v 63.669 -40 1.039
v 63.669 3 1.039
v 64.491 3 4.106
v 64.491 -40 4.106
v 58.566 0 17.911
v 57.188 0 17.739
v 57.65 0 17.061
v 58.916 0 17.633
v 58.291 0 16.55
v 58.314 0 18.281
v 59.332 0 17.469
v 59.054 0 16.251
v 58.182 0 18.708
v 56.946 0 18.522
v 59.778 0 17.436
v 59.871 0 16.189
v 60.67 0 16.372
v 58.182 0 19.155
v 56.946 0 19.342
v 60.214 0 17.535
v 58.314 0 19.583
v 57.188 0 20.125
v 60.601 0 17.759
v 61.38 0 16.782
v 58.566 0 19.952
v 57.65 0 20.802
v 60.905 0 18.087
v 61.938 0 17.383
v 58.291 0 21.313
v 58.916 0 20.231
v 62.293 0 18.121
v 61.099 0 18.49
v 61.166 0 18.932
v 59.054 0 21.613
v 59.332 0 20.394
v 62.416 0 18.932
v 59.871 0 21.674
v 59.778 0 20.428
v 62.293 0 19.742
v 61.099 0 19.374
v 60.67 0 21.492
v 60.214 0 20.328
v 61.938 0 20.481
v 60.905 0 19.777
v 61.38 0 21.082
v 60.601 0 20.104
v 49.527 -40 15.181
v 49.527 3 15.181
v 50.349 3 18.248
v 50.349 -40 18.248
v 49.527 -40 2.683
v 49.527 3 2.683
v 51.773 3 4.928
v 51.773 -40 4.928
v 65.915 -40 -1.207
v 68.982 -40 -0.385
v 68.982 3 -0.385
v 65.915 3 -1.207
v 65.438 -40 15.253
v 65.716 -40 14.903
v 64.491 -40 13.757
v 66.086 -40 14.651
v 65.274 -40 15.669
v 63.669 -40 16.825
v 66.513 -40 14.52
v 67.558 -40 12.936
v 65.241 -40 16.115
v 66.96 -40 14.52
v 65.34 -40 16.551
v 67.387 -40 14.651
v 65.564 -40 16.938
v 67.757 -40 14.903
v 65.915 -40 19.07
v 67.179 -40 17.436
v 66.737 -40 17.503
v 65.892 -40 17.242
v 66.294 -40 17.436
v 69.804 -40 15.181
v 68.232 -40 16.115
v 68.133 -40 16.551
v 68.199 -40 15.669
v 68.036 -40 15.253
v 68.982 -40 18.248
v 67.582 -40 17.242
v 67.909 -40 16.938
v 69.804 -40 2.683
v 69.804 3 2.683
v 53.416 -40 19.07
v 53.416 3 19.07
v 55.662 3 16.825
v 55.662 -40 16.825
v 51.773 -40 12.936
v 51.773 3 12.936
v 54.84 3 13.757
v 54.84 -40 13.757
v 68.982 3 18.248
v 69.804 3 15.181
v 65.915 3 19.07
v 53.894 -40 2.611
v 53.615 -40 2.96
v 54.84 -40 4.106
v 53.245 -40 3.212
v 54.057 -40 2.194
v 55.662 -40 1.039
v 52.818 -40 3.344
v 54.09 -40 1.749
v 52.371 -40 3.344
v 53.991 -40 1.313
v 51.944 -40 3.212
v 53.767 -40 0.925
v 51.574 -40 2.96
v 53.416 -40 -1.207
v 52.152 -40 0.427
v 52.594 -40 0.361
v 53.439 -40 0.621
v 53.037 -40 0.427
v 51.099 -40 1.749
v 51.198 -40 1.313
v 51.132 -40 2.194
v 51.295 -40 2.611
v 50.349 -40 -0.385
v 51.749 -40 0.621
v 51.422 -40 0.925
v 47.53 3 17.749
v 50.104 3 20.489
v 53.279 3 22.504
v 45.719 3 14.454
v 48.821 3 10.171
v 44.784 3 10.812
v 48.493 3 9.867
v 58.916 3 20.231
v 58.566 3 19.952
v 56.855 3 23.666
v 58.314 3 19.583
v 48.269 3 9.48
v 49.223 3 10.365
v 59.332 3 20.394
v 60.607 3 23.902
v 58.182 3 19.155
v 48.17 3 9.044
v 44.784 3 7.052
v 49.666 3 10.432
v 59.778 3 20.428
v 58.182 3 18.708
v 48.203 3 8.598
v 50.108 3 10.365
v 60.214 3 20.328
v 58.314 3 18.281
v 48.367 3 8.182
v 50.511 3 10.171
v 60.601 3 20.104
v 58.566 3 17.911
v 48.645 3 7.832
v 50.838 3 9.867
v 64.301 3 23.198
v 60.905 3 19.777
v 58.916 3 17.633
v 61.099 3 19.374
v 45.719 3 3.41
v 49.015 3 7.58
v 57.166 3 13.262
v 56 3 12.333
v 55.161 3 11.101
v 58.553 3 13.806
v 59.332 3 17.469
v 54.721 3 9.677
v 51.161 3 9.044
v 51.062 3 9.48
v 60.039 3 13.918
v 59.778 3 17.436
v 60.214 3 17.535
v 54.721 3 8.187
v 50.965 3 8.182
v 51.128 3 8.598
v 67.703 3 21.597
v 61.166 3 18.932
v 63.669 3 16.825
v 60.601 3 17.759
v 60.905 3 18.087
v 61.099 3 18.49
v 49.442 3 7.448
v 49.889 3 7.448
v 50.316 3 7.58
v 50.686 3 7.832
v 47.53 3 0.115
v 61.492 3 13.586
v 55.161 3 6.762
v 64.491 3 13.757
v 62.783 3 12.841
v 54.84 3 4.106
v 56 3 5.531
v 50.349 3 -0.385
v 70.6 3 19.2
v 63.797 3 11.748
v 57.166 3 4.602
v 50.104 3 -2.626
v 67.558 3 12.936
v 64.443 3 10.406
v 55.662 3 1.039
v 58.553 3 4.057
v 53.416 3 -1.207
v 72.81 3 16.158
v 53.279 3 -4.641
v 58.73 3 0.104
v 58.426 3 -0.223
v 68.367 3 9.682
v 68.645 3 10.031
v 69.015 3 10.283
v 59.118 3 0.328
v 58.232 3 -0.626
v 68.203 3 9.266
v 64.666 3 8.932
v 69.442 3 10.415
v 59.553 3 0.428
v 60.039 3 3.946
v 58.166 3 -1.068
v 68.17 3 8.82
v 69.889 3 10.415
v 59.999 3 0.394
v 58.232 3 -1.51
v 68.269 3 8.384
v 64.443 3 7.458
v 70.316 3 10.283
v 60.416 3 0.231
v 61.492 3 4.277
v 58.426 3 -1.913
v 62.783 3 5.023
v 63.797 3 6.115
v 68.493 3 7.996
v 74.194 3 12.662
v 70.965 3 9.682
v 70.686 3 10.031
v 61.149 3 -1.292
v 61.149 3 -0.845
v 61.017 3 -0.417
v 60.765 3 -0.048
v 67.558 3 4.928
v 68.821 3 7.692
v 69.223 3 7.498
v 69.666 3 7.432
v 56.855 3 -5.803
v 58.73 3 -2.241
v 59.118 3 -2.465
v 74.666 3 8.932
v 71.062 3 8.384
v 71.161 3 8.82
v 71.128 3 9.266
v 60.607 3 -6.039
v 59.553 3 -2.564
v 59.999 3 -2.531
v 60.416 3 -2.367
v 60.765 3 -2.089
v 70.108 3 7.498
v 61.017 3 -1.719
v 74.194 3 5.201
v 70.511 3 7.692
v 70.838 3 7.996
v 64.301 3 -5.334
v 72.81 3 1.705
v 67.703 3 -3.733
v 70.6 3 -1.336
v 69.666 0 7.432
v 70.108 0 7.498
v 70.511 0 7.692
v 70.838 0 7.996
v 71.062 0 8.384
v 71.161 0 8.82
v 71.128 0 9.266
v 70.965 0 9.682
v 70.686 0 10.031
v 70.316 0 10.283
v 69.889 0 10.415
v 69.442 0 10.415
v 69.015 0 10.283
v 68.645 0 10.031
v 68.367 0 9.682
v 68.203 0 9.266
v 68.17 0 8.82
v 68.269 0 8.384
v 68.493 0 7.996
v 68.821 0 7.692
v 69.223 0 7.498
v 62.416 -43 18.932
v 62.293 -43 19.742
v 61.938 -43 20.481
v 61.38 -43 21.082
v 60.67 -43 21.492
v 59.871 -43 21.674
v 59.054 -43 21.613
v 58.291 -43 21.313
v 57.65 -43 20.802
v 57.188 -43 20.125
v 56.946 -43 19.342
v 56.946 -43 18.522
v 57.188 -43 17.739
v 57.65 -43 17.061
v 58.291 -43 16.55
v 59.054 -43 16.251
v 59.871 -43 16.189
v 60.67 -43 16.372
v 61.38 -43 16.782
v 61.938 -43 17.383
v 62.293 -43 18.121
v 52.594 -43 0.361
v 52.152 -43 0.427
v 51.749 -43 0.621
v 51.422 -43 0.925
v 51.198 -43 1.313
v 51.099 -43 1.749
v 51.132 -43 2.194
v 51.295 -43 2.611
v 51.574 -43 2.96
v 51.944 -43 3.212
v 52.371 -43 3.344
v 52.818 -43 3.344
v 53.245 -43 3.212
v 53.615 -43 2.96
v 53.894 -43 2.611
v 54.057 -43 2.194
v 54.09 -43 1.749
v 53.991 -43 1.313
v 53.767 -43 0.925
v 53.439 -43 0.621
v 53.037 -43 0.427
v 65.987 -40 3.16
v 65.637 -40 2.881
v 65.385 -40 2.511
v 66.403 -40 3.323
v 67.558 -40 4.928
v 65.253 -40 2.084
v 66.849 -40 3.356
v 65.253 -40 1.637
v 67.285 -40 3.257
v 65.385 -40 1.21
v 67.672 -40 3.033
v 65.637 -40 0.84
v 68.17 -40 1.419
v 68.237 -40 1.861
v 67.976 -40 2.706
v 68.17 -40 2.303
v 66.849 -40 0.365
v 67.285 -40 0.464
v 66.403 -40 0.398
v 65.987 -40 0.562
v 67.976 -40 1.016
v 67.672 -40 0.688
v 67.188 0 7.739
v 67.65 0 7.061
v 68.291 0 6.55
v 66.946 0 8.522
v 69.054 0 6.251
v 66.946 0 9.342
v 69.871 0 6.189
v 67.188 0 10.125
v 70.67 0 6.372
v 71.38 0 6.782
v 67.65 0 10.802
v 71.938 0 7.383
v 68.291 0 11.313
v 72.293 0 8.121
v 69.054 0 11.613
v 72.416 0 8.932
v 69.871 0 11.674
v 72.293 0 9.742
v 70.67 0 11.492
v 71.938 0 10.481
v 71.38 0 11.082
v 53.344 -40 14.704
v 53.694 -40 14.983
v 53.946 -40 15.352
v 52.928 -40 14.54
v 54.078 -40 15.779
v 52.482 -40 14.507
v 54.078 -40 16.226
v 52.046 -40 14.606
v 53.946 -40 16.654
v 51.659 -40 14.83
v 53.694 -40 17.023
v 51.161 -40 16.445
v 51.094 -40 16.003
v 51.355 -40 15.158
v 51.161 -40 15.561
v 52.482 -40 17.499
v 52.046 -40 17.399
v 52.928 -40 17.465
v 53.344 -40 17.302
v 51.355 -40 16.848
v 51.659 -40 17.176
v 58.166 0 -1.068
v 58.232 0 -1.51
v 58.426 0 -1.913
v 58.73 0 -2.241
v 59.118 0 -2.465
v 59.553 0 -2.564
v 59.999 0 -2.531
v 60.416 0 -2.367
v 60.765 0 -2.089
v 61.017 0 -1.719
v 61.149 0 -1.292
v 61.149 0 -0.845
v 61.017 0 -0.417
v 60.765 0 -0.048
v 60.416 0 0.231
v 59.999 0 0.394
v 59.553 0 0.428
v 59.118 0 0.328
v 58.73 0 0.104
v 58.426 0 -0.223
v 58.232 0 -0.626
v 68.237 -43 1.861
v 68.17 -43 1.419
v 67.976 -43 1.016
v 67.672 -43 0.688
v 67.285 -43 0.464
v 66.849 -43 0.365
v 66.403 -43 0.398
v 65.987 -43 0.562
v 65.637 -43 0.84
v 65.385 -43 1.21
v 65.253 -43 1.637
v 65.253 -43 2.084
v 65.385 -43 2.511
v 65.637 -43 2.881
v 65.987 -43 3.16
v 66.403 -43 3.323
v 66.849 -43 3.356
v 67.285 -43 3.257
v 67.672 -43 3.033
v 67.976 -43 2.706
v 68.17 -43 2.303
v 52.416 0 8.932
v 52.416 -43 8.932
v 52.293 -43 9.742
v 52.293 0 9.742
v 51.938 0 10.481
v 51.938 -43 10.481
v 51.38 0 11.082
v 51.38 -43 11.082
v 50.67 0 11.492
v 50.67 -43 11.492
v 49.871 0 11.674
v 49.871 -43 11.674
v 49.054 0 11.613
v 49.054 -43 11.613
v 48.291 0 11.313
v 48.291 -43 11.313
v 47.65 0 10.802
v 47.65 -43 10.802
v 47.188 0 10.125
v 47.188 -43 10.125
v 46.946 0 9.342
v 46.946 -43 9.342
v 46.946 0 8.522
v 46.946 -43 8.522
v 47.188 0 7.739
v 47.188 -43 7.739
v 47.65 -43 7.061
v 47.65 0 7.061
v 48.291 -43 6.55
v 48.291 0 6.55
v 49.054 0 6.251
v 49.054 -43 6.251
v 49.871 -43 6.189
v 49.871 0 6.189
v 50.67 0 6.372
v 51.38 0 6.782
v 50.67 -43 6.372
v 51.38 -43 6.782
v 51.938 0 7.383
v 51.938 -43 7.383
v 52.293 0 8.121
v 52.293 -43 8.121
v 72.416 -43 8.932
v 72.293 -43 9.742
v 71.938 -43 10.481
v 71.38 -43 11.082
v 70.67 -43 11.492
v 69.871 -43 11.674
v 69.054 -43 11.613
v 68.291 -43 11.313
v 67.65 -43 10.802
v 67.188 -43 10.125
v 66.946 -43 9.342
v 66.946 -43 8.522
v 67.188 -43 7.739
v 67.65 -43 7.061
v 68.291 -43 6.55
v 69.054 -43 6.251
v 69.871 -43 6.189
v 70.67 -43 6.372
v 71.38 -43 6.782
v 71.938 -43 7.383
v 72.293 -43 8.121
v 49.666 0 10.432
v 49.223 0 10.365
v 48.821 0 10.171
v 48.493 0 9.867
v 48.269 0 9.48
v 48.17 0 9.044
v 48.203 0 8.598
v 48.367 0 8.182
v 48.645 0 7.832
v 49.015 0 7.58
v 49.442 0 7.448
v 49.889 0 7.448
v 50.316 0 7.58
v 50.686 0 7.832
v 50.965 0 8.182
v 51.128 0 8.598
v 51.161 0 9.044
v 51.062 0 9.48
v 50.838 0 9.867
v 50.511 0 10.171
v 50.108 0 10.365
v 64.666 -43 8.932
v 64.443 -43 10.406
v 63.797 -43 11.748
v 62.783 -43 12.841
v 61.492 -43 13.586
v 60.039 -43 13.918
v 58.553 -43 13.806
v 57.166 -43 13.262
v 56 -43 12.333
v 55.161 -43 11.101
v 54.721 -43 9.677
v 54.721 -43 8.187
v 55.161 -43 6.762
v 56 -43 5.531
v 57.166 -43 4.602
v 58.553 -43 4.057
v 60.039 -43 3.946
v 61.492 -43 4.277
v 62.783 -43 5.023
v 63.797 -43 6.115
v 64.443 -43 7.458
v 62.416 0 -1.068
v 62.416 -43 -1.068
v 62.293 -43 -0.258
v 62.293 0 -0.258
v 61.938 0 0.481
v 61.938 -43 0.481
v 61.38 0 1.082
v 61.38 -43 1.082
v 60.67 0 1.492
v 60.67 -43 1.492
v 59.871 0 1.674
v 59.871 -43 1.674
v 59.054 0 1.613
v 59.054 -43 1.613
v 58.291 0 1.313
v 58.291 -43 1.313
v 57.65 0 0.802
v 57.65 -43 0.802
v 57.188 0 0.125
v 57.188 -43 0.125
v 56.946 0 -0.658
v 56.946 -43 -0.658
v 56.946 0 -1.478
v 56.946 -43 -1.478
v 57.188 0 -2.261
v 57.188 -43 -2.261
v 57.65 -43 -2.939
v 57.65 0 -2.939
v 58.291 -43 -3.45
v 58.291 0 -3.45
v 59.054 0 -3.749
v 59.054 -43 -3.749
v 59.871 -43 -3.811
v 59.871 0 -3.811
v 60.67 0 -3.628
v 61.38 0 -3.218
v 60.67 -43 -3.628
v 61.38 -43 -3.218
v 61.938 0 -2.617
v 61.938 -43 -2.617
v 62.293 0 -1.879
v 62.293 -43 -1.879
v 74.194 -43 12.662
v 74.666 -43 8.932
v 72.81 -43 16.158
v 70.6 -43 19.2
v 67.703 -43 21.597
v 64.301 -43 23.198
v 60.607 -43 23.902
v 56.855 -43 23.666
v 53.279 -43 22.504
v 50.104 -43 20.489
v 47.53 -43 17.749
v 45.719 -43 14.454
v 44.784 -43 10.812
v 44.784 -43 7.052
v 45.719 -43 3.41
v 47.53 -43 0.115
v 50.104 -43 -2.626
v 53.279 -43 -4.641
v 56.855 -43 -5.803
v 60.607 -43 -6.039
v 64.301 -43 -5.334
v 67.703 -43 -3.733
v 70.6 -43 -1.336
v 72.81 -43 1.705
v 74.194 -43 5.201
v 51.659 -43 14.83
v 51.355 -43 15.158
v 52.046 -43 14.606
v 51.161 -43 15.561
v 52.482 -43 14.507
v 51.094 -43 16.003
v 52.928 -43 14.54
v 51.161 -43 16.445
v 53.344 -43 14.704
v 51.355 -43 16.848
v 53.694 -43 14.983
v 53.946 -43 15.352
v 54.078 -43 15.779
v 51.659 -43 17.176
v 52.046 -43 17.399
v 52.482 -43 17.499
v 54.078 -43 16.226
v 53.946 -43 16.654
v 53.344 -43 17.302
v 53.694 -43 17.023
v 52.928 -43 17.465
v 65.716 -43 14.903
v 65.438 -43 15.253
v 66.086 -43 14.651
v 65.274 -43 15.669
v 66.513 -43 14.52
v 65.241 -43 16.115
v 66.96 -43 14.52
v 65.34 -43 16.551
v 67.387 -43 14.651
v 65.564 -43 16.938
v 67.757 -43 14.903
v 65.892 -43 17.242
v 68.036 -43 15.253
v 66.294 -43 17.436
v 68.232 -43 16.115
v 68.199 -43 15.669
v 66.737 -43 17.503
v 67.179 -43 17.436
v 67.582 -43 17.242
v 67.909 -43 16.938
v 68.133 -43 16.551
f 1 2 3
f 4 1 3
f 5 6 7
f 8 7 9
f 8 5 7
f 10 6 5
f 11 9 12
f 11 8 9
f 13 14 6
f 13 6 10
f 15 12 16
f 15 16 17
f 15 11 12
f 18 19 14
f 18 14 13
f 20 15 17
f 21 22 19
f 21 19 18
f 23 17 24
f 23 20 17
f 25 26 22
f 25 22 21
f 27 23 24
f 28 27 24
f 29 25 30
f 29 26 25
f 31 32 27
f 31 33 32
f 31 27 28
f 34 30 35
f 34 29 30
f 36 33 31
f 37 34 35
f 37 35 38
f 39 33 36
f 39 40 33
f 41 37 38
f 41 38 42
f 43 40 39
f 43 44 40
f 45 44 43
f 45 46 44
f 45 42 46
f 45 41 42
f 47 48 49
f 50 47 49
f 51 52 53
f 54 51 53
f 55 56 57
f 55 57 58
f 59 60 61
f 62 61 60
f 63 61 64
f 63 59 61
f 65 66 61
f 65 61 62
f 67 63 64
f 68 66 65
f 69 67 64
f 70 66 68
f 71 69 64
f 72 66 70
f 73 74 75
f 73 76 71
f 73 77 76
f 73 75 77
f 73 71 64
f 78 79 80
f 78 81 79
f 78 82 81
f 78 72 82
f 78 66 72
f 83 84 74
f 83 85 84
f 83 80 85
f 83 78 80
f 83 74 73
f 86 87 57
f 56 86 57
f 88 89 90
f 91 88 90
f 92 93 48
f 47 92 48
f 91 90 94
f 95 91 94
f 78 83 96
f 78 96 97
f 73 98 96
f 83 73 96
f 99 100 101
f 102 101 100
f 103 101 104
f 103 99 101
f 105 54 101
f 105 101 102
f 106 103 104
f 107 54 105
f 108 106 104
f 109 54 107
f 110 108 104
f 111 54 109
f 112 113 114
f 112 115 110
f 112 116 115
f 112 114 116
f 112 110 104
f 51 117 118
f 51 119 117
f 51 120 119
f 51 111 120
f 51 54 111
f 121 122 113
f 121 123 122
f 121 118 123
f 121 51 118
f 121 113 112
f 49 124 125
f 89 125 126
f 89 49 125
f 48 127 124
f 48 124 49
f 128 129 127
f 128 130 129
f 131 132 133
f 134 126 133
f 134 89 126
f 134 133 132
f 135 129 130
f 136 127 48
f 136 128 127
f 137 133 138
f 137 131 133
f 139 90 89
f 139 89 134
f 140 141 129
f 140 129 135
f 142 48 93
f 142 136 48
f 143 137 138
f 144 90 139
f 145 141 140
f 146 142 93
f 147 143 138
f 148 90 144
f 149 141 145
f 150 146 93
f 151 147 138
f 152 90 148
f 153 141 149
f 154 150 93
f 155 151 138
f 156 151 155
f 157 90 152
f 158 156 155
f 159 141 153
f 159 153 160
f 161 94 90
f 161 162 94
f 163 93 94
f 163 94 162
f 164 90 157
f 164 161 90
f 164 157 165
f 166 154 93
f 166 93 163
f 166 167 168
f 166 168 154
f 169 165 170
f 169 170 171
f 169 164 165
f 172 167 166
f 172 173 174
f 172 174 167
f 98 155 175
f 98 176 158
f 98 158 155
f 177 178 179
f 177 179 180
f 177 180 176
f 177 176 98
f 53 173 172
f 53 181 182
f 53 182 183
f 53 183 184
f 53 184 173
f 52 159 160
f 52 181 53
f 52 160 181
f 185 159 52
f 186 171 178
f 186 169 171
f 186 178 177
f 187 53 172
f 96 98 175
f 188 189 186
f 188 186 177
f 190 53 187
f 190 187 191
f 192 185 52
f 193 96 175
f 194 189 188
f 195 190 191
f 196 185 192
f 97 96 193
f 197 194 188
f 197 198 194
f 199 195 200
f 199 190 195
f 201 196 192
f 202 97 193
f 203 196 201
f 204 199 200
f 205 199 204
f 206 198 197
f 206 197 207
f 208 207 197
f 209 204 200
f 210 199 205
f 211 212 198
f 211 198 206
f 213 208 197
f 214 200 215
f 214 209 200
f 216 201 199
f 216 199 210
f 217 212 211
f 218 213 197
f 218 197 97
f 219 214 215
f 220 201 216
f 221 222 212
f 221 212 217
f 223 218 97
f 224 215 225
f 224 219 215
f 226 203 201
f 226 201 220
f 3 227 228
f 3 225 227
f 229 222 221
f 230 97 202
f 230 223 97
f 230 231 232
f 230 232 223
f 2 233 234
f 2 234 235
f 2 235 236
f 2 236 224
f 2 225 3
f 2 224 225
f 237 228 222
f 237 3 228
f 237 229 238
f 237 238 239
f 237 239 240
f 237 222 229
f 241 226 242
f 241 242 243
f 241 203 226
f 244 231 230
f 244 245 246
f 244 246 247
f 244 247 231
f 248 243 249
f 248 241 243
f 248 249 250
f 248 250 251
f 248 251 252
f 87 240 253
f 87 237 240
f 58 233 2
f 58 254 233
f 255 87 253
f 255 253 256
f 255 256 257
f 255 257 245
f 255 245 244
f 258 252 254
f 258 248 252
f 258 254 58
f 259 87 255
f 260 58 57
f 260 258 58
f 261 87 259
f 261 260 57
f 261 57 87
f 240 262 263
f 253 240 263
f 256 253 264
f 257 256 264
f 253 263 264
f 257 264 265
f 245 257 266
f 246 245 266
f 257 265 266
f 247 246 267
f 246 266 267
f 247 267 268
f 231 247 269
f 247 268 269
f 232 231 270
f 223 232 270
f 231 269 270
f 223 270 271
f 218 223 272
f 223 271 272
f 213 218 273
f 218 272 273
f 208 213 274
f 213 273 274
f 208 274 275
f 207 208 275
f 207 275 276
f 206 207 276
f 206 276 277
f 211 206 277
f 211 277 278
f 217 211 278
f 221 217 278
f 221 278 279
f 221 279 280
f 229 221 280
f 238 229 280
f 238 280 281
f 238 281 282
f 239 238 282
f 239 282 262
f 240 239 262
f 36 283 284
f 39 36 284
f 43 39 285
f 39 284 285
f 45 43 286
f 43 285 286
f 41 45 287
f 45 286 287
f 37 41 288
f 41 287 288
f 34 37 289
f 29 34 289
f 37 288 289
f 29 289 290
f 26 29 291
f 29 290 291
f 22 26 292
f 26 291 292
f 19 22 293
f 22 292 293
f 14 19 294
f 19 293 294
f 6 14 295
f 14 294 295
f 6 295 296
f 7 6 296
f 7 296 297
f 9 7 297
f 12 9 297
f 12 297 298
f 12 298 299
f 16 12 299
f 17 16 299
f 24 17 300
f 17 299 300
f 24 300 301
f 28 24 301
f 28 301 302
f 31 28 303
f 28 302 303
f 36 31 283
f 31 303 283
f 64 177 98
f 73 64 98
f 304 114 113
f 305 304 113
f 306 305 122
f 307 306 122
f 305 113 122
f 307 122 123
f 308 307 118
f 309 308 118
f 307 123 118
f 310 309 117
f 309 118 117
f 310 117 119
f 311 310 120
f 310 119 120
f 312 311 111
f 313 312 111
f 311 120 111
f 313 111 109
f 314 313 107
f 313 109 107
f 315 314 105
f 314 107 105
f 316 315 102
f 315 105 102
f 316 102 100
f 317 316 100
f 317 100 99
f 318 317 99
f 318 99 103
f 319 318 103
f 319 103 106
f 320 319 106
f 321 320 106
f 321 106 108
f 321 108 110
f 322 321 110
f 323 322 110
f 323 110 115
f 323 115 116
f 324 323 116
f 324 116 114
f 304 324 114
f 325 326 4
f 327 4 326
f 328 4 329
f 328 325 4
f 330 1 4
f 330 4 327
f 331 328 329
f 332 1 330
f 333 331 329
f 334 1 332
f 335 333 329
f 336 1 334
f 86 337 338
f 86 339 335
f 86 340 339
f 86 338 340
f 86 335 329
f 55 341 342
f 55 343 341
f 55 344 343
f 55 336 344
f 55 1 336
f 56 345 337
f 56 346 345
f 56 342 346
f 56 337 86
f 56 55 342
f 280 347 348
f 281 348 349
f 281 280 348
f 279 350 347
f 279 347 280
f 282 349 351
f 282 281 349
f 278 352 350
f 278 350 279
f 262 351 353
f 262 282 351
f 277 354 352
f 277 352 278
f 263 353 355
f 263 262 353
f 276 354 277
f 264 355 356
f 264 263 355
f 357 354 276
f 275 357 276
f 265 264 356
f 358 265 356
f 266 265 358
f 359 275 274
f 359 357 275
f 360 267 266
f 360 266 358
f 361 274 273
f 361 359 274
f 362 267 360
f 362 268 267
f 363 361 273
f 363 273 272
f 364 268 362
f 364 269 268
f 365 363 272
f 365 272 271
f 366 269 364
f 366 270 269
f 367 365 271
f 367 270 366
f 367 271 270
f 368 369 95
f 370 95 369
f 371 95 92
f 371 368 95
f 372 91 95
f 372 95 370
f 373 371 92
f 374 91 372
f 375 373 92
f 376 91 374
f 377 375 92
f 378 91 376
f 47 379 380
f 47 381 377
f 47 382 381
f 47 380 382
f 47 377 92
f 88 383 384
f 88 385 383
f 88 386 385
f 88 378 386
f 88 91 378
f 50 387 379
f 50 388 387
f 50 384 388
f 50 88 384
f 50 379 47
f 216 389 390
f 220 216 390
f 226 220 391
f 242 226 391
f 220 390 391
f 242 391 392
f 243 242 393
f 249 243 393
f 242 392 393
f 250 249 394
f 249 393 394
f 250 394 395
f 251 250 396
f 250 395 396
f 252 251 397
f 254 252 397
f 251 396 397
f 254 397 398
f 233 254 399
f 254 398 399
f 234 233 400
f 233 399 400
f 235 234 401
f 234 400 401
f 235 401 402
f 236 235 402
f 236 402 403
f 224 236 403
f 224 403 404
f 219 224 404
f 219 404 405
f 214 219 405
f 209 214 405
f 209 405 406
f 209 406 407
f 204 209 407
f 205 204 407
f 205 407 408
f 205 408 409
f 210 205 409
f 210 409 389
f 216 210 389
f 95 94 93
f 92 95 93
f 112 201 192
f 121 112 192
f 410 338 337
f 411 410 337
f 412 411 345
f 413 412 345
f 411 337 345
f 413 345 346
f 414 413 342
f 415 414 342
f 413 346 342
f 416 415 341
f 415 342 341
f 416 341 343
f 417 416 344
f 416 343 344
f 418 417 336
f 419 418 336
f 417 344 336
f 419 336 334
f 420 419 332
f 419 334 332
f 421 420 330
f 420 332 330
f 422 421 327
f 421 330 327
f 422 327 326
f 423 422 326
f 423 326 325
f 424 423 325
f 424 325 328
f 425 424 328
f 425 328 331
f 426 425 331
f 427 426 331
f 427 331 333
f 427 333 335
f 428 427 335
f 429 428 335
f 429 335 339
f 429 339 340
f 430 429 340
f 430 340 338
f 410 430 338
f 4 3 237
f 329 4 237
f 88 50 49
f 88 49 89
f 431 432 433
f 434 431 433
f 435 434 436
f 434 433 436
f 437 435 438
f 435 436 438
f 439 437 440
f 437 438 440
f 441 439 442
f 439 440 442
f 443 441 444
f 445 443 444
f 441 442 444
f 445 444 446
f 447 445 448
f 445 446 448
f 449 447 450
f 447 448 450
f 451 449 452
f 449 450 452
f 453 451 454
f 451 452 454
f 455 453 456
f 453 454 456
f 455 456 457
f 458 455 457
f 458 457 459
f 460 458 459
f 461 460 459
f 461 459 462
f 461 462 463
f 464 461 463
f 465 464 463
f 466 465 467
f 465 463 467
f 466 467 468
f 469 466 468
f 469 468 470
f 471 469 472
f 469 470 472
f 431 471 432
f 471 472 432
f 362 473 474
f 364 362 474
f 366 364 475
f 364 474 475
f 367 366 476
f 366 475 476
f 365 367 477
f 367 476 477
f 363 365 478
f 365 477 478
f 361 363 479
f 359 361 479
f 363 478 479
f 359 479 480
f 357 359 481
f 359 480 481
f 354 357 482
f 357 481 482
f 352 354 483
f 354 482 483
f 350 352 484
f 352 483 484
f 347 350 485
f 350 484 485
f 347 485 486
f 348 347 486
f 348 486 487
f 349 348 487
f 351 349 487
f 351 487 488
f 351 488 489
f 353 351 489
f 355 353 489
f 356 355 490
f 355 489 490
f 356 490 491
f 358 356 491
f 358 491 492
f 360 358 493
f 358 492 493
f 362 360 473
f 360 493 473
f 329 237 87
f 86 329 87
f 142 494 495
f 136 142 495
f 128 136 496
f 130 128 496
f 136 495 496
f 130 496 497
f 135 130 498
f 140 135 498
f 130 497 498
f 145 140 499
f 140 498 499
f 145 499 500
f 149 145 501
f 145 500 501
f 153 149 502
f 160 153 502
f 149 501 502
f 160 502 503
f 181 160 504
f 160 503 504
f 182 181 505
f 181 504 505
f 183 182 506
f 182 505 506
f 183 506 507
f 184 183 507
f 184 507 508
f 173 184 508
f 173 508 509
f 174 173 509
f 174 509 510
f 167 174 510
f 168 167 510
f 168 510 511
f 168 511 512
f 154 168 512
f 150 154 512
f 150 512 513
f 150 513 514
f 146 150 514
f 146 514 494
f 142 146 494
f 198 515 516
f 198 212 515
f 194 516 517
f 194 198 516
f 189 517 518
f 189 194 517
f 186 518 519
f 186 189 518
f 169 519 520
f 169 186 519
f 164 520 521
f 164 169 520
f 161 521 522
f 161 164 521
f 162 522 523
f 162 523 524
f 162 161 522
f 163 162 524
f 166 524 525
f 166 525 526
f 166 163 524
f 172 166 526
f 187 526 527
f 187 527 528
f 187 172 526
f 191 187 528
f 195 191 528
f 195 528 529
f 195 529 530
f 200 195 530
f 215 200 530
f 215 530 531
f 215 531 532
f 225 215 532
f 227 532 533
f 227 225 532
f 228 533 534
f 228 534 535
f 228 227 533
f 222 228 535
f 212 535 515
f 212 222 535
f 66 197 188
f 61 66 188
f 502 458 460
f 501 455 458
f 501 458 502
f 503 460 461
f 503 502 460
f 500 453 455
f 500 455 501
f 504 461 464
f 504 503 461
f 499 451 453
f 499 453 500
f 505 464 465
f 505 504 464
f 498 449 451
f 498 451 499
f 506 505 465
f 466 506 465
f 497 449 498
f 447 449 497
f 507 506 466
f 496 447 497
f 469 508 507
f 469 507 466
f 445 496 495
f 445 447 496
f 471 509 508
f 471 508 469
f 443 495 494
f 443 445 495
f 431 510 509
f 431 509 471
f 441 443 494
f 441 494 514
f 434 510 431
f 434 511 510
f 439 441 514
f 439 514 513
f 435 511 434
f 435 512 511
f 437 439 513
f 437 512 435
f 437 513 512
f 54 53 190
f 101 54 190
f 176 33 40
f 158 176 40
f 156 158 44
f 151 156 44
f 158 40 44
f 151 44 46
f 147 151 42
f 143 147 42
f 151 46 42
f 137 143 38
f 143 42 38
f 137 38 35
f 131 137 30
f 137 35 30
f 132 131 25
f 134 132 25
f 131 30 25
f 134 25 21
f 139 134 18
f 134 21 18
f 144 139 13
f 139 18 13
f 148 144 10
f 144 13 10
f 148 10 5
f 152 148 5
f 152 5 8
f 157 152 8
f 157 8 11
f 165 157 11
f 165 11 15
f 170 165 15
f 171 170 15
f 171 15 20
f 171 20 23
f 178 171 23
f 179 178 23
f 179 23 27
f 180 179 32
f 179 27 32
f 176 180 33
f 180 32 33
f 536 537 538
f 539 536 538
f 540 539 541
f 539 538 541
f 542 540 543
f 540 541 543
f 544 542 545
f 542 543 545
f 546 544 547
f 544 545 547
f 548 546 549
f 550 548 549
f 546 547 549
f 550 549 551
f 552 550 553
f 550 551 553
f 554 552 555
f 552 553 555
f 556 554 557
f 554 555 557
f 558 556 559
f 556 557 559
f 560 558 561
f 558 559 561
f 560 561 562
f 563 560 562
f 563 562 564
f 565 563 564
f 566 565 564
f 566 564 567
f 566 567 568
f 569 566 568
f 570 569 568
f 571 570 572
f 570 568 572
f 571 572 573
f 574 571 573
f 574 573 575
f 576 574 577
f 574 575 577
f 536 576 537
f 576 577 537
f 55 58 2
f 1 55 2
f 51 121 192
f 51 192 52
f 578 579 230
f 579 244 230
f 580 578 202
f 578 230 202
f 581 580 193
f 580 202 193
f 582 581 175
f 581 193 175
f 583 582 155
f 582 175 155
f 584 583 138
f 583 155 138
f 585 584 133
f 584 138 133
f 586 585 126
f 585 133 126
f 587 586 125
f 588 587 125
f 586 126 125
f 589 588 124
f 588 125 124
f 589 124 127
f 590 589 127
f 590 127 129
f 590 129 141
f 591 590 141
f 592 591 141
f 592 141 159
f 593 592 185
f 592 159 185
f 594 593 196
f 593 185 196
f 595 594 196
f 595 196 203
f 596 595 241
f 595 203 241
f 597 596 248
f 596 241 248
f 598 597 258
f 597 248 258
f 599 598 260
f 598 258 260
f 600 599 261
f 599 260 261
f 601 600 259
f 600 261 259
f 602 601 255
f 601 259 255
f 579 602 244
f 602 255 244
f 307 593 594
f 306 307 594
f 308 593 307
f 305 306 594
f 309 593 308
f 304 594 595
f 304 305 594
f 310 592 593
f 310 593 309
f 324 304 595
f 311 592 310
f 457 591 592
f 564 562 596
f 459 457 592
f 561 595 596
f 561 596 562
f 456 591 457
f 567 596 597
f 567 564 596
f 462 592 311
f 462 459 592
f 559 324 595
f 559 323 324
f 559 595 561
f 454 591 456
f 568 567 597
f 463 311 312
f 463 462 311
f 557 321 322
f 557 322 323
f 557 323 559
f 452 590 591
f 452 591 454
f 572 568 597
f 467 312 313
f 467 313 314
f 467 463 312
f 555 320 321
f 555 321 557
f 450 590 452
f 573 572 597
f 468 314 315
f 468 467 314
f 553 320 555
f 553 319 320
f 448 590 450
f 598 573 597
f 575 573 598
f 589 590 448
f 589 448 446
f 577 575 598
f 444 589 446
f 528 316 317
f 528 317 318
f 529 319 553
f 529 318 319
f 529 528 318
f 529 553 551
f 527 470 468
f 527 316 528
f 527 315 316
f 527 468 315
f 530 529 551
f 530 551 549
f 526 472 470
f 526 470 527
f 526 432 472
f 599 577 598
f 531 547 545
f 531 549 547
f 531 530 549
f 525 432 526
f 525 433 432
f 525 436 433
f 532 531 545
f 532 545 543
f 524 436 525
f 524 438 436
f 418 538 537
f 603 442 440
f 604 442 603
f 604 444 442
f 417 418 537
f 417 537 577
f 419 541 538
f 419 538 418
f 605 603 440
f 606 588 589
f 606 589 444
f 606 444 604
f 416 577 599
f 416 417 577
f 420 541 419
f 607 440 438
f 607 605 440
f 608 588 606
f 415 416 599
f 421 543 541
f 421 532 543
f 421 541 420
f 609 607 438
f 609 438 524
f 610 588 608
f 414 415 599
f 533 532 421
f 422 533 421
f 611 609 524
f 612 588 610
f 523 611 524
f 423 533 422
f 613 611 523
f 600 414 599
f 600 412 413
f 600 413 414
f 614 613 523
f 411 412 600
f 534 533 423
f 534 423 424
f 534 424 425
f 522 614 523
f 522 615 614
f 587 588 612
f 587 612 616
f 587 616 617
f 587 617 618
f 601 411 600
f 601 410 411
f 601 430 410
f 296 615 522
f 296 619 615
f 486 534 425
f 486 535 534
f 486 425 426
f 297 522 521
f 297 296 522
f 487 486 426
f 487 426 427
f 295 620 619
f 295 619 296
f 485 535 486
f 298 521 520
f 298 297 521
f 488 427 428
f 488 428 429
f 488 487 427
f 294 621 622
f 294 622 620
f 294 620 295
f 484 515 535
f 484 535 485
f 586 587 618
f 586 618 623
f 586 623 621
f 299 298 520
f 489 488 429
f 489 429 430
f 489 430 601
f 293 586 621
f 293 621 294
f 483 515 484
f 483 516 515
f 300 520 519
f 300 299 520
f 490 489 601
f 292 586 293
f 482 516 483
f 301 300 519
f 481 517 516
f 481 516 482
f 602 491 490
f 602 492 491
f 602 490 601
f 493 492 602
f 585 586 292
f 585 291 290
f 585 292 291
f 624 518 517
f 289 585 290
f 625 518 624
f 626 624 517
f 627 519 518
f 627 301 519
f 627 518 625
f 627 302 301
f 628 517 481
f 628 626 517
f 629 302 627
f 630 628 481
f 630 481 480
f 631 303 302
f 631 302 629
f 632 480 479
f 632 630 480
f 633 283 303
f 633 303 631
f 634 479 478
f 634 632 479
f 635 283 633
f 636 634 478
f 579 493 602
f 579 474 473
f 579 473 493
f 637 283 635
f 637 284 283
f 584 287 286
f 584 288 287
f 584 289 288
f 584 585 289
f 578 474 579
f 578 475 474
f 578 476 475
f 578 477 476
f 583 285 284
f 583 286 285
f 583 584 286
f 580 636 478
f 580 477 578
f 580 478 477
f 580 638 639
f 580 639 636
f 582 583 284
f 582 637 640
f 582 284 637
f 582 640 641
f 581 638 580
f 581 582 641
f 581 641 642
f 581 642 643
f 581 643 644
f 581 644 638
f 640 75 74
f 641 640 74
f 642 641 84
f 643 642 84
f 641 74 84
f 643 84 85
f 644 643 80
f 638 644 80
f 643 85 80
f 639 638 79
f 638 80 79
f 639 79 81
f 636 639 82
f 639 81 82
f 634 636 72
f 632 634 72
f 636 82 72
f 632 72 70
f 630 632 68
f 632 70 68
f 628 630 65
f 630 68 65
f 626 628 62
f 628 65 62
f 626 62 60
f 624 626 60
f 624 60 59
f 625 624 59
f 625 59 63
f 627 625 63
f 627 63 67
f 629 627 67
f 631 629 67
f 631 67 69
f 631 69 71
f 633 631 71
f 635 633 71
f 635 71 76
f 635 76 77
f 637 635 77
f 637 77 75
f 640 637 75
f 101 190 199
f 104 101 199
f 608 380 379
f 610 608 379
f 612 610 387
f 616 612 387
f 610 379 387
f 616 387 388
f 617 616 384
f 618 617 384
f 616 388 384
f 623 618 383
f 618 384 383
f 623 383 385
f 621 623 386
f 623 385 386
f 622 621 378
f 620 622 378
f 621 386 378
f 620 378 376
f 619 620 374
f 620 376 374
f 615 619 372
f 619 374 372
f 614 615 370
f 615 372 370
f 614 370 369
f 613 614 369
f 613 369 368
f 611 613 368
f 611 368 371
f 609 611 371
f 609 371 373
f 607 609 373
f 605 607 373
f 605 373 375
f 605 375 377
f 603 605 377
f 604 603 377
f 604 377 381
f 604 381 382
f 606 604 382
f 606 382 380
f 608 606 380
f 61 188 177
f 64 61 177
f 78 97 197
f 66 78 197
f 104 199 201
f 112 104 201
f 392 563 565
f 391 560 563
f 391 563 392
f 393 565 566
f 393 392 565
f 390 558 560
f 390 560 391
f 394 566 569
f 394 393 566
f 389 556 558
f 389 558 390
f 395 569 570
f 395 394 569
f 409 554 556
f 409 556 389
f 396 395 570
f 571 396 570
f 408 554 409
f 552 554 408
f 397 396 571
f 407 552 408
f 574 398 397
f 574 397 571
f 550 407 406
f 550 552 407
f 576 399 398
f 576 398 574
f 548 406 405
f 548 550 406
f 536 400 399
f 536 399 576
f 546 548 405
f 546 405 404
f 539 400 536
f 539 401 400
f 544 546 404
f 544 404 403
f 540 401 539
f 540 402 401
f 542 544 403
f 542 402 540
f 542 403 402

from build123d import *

# Parameters (mm, degrees)
SKETCH_1_R               = 15
SKETCH_1_R_2             = 5
EXTRUDE_4_DEPTH          = 3
SKETCH_1_R_3             = 3.5
SKETCH_1_R_4             = 2.1
EXTRUDE_4_2_DEPTH        = 3
EXTRUDE_5_DEPTH          = 3
PATTERN_CIRCULAR_2_COUNT = 4
SKETCH_6_R               = 3.5
SKETCH_6_R_2             = 2.1
EXTRUDE_6_DEPTH          = 3
PATTERN_CIRCULAR_3_COUNT = 4
SKETCH_7_R               = 15
SKETCH_7_R_2             = 5
EXTRUDE_7_DEPTH          = 46
CUT_EXTRUDE_1_DEPTH      = 46
PATTERN_CIRCULAR_4_COUNT = 4
SKETCH_11_R              = 1.5
CUT_EXTRUDE_2_DEPTH      = 3
PATTERN_CIRCULAR_5_COUNT = 4
EXTRUDE_8_DEPTH          = 3
EXTRUDE_9_DEPTH          = 3
EXTRUDE_10_DEPTH         = 3
EXTRUDE_11_DEPTH         = 3
EXTRUDE_13_DEPTH         = 3
EXTRUDE_14_DEPTH         = 3
CUT_EXTRUDE_3_DEPTH      = 2.5
SKETCH_19_R              = 1.5
CUT_EXTRUDE_4_DEPTH      = 2.5
SKETCH_20_R              = 1.5
CUT_EXTRUDE_5_DEPTH      = 2.5
SKETCH_21_R              = 15
SKETCH_21_R_2            = 5
EXTRUDE_15_DEPTH         = 3
SKETCH_22_R              = 1.5
CUT_EXTRUDE_6_DEPTH      = 3
PATTERN_CIRCULAR_6_COUNT = 4
EXTRUDE_16_DEPTH         = 3
CUT_EXTRUDE_7_DEPTH      = 3
SKETCH_25_R              = 15
SKETCH_25_R_2            = 5
EXTRUDE_17_DEPTH         = 43
SKETCH_27_R              = 1.5
CUT_EXTRUDE_8_DEPTH      = 46
SKETCH_28_R              = 2.75
CUT_EXTRUDE_9_DEPTH      = 43
SKETCH_29_R              = 1.5
CUT_EXTRUDE_10_DEPTH     = 46
PATTERN_CIRCULAR_7_COUNT = 4
CUT_EXTRUDE_11_DEPTH     = 43
PATTERN_CIRCULAR_8_COUNT = 4
SKETCH_31_R              = 43.855676254
CUT_EXTRUDE_12_DEPTH     = 100


with BuildPart() as part:
    # 草图1 → 凸台-拉伸4 (new body)
    with BuildSketch(Plane(origin=(0, 0, 0), x_dir=(1, 0, 0), z_dir=(0, 1, 0))):
        with Locations((-5.372895461, -8.931727747)):
            Circle(SKETCH_1_R)
        with Locations((-5.372895461, -8.931727747)):
            Circle(SKETCH_1_R_2, mode=Mode.SUBTRACT)
    extrude(amount=EXTRUDE_4_DEPTH)



with BuildPart() as body_2:
    # 草图1 → Extrude 4 2 (new body)
    with BuildSketch(Plane(origin=(0, 0, 0), x_dir=(1, 0, 0), z_dir=(0, 1, 0))):
        with Locations((-22.372895461, 8.068272253)):
            Circle(SKETCH_1_R_3)
        with Locations((-22.372895461, 8.068272253)):
            Circle(SKETCH_1_R_4, mode=Mode.SUBTRACT)
    extrude(amount=EXTRUDE_4_2_DEPTH)


with BuildPart() as part_1:
    add(part.part)

    add(body_2.part)  # 凸台-拉伸5 merges body 2
    # 草图5 → 凸台-拉伸5 (add)
    with BuildSketch(Plane(origin=(0, 0, 0), x_dir=(1, 0, 0), z_dir=(0, 1, 0))):
        Polygon((-22.372895461, 4.568272253), (-10.372895461, -8.931727747), (-10.372895461, -3.931727747), (-5.372895461, -3.931727747), (-18.872895461, 8.068272253), align=None)
    extrude_5 = extrude(amount=EXTRUDE_5_DEPTH)

    # 阵列(圆周)2: 凸台-拉伸5 ×4 about axis
    pattern_circular_2_axis = Axis((-5.372895461, 0, 8.931727747), (0, 1, 0))
    for i in range(1, PATTERN_CIRCULAR_2_COUNT):
        add(extrude_5.rotate(pattern_circular_2_axis, i * 360 / PATTERN_CIRCULAR_2_COUNT))

    # 草图6 → 凸台-拉伸6 (add)
    with BuildSketch(Plane(origin=(0, 3, 0), x_dir=(1, 0, 0), z_dir=(0, 1, 0))):
        with Locations((11.627104539, 8.068272253)):
            Circle(SKETCH_6_R)
        with Locations((11.627104539, 8.068272253)):
            Circle(SKETCH_6_R_2, mode=Mode.SUBTRACT)
    extrude_6 = extrude(amount=-EXTRUDE_6_DEPTH)

    # 阵列(圆周)3: 凸台-拉伸6 ×4 about axis
    pattern_circular_3_axis = Axis((-5.372895461, 0, 8.931727747), (0, 1, 0))
    for i in range(1, PATTERN_CIRCULAR_3_COUNT):
        add(extrude_6.rotate(pattern_circular_3_axis, i * 360 / PATTERN_CIRCULAR_3_COUNT))

    # 草图7 → 凸台-拉伸7 (add)
    with BuildSketch(Plane.XZ):
        with Locations((-5.372895461, 8.931727747)):
            Circle(SKETCH_7_R)
        with Locations((-5.372895461, 8.931727747)):
            Circle(SKETCH_7_R_2, mode=Mode.SUBTRACT)
    extrude(amount=EXTRUDE_7_DEPTH)

    # 草图9 → 切除-拉伸1 (cut)
    with BuildSketch(Plane(origin=(0, 3, 0), x_dir=(1, 0, 0), z_dir=(0, 1, 0))):
        Polygon((0.876311502, -19.070022006), (-1.369054096, -16.824656408), (-0.547193246, -13.757429961), (2.520033201, -12.935569112), (4.765398798, -15.180934709), (3.943537949, -18.248161156), align=None)
    cut_extrude_1 = extrude(amount=-CUT_EXTRUDE_1_DEPTH, mode=Mode.SUBTRACT)

    # 阵列(圆周)4: 切除-拉伸1 ×4 about axis
    pattern_circular_4_axis = Axis((-5.372895461, 0, 8.931727747), (0, 1, 0))
    for i in range(1, PATTERN_CIRCULAR_4_COUNT):
        add(cut_extrude_1.rotate(pattern_circular_4_axis, i * 360 / PATTERN_CIRCULAR_4_COUNT), mode=Mode.SUBTRACT)

    # 草图11 → 切除-拉伸2 (cut)
    with BuildSketch(Plane(origin=(0, -43, 0), x_dir=(1, 0, 0), z_dir=(0, 1, 0))):
        with Locations((1.698172351, -1.860659935)):
            Circle(SKETCH_11_R)
    cut_extrude_2 = extrude(amount=-CUT_EXTRUDE_2_DEPTH, mode=Mode.SUBTRACT)

    # 阵列(圆周)5: 切除-拉伸2 ×4 about axis
    pattern_circular_5_axis = Axis((-5.372895461, 0, 8.931727747), (0, 1, 0))
    for i in range(1, PATTERN_CIRCULAR_5_COUNT):
        add(cut_extrude_2.rotate(pattern_circular_5_axis, i * 360 / PATTERN_CIRCULAR_5_COUNT), mode=Mode.SUBTRACT)

    # 草图12 → 凸台-拉伸8 (add)
    with BuildSketch(Plane(origin=(0, 3, 0), x_dir=(1, 0, 0), z_dir=(0, 1, 0))):
        Polygon((15.127104539, 8.068272253), (15.127104539, -25.931727747), (11.627104539, -22.431727747), (11.627104539, 4.568272253), align=None)
    extrude(amount=-EXTRUDE_8_DEPTH)

    # 草图13 → 凸台-拉伸9 (add)
    with BuildSketch(Plane(origin=(0, 3, 0), x_dir=(1, 0, 0), z_dir=(0, 1, 0))):
        Polygon((11.627104539, 11.568272253), (-22.372895461, 11.568272253), (-18.872895461, 8.068272253), (8.127104539, 8.068272253), align=None)
    extrude(amount=-EXTRUDE_9_DEPTH)

    # 草图14 → 凸台-拉伸10 (add)
    with BuildSketch(Plane(origin=(0, 3, 0), x_dir=(1, 0, 0), z_dir=(0, 1, 0))):
        Polygon((-25.872895461, 8.068272253), (-25.872895461, -25.931727747), (-22.372895461, -22.431727747), (-22.372895461, 4.568272253), align=None)
    extrude(amount=-EXTRUDE_10_DEPTH)

    # 草图15 → 凸台-拉伸11 (add)
    with BuildSketch(Plane(origin=(0, 3, 0), x_dir=(1, 0, 0), z_dir=(0, 1, 0))):
        Polygon((-22.372895461, -29.431727747), (11.627104539, -29.431727747), (8.127104539, -25.931727747), (-18.872895461, -25.931727747), align=None)
    extrude(amount=-EXTRUDE_11_DEPTH)

    # 草图16 → 凸台-拉伸13 (add)
    with BuildSketch(Plane.XZ):
        Polygon((-10.747895461, -4.193272253), (0.002104539, -4.193272253), (5.163560245, -8.068272253), (4.99115505, -11.568272253), (0.002104539, -14.943272253), (-10.747895461, -14.943272253), (-15.736945971, -11.568272253), (-15.909351166, -8.068272253), align=None)
        Polygon((-7.57246898, -9.568272253), (-9.16018222, -6.818272253), (-12.335608701, -6.818272253), (-13.923321941, -9.568272253), (-12.335608701, -12.318272253), (-9.16018222, -12.318272253), align=None, mode=Mode.SUBTRACT)
        Polygon((3.17753102, -9.568272253), (1.58981778, -6.818272253), (-1.585608701, -6.818272253), (-3.173321941, -9.568272253), (-1.585608701, -12.318272253), (1.58981778, -12.318272253), align=None, mode=Mode.SUBTRACT)
    extrude(amount=-EXTRUDE_13_DEPTH)

    # 草图18 → 凸台-拉伸14 (add)
    with BuildSketch(Plane.XZ):
        Polygon((-7.57246898, -9.568272253), (-9.16018222, -6.818272253), (-12.335608701, -6.818272253), (-13.923321941, -9.568272253), (-12.335608701, -12.318272253), (-9.16018222, -12.318272253), align=None)
        Polygon((3.17753102, -9.568272253), (1.58981778, -6.818272253), (-1.585608701, -6.818272253), (-3.173321941, -9.568272253), (-1.585608701, -12.318272253), (1.58981778, -12.318272253), align=None)
    extrude(amount=-EXTRUDE_14_DEPTH)

    # 草图17 → 切除-拉伸3 (cut)
    with BuildSketch(Plane.XZ):
        Polygon((-7.57246898, -9.568272253), (-9.16018222, -6.818272253), (-12.335608701, -6.818272253), (-13.923321941, -9.568272253), (-12.335608701, -12.318272253), (-9.16018222, -12.318272253), align=None)
        Polygon((3.17753102, -9.568272253), (1.58981778, -6.818272253), (-1.585608701, -6.818272253), (-3.173321941, -9.568272253), (-1.585608701, -12.318272253), (1.58981778, -12.318272253), align=None)
    extrude(amount=-CUT_EXTRUDE_3_DEPTH, mode=Mode.SUBTRACT)

    # 草图19 → 切除-拉伸4 (cut)
    with BuildSketch(Plane.XZ.offset(-2.5)):
        with Locations((0.002104539, -9.568272253)):
            Circle(SKETCH_19_R)
    extrude(amount=-CUT_EXTRUDE_4_DEPTH, mode=Mode.SUBTRACT)

    # 草图20 → 切除-拉伸5 (cut)
    with BuildSketch(Plane.XZ.offset(-2.5)):
        with Locations((-10.747895461, -9.568272253)):
            Circle(SKETCH_20_R)
    extrude(amount=-CUT_EXTRUDE_5_DEPTH, mode=Mode.SUBTRACT)

    # 草图8 → 凸台-拉伸16 (add)
    with BuildSketch(Plane.XZ.offset(46)):
        Polygon((3.943537949, 18.248161156), (0.876311502, 19.070022006), (-1.369054096, 16.824656408), (-0.547193246, 13.757429961), (2.520033201, 12.935569112), (4.765398798, 15.180934709), align=None)
    extrude(amount=EXTRUDE_16_DEPTH)

    # 草图24 → 切除-拉伸7 (cut)
    with BuildSketch(Plane.XZ.offset(49)):
        Polygon((4.765398798, 15.180934709), (3.943537949, 18.248161156), (0.876311502, 19.070022006), (-1.369054096, 16.824656408), (-0.547193246, 13.757429961), (2.520033201, 12.935569112), align=None)
    extrude(amount=-CUT_EXTRUDE_7_DEPTH, mode=Mode.SUBTRACT)

    # 草图31 → 切除-拉伸12 (cut)
    with BuildSketch(Plane(origin=(0, 3, 0), x_dir=(1, 0, 0), z_dir=(0, 1, 0))):
        with Locations((-6.865297473, -8.372369535)):
            Circle(SKETCH_31_R)
    extrude(amount=-CUT_EXTRUDE_12_DEPTH, mode=Mode.SUBTRACT)


with BuildPart() as body_2_2:
    # 草图21 → 凸台-拉伸15 (new body)
    with BuildSketch(Plane(origin=(0, 0, 0), x_dir=(1, 0, 0), z_dir=(0, 1, 0))):
        with Locations((59.665545214, -8.931727747)):
            Circle(SKETCH_21_R)
        with Locations((59.665545214, -8.931727747)):
            Circle(SKETCH_21_R_2, mode=Mode.SUBTRACT)
    extrude(amount=EXTRUDE_15_DEPTH)

    # 草图22 → 切除-拉伸6 (cut)
    with BuildSketch(Plane.XZ):
        with Locations((59.665545214, 18.931727747)):
            Circle(SKETCH_22_R)
    cut_extrude_6 = extrude(amount=-CUT_EXTRUDE_6_DEPTH, mode=Mode.SUBTRACT)

    # 阵列(圆周)6: 切除-拉伸6 ×4 about axis
    pattern_circular_6_axis = Axis((59.665545214, 0, 8.931727747), (0, 1, 0))
    for i in range(1, PATTERN_CIRCULAR_6_COUNT):
        add(cut_extrude_6.rotate(pattern_circular_6_axis, i * 360 / PATTERN_CIRCULAR_6_COUNT), mode=Mode.SUBTRACT)

    # 草图25 → 凸台-拉伸17 (add)
    with BuildSketch(Plane.XZ):
        with Locations((59.665545214, 8.931727747)):
            Circle(SKETCH_25_R)
        with Locations((59.665545214, 8.931727747)):
            Circle(SKETCH_25_R_2, mode=Mode.SUBTRACT)
    extrude(amount=EXTRUDE_17_DEPTH)

    # 草图27 → 切除-拉伸8 (cut)
    with BuildSketch(Plane(origin=(0, 3, 0), x_dir=(1, 0, 0), z_dir=(0, 1, 0))):
        with Locations((59.665545214, 1.068272253)):
            Circle(SKETCH_27_R)
        with Locations((69.665545214, -8.931727747)):
            Circle(SKETCH_27_R)
        with Locations((59.665545214, -18.931727747)):
            Circle(SKETCH_27_R)
        with Locations((49.665545214, -8.931727747)):
            Circle(SKETCH_27_R)
    extrude(amount=-CUT_EXTRUDE_8_DEPTH, mode=Mode.SUBTRACT)

    # 草图28 → 切除-拉伸9 (cut)
    with BuildSketch(Plane.XZ.offset(43)):
        with Locations((59.665545214, 18.931727747)):
            Circle(SKETCH_28_R)
        with Locations((49.665545214, 8.931727747)):
            Circle(SKETCH_28_R)
        with Locations((59.665545214, -1.068272253)):
            Circle(SKETCH_28_R)
        with Locations((69.665545214, 8.931727747)):
            Circle(SKETCH_28_R)
    extrude(amount=-CUT_EXTRUDE_9_DEPTH, mode=Mode.SUBTRACT)

    # 草图29 → 切除-拉伸10 (cut)
    with BuildSketch(Plane(origin=(0, 3, 0), x_dir=(1, 0, 0), z_dir=(0, 1, 0))):
        with Locations((66.736613026, -1.860659935)):
            Circle(SKETCH_29_R)
    cut_extrude_10 = extrude(amount=-CUT_EXTRUDE_10_DEPTH, mode=Mode.SUBTRACT)

    # 阵列(圆周)7: 切除-拉伸10 ×4 about axis
    pattern_circular_7_axis = Axis((59.665545214, 0, 8.931727747), (0, 1, 0))
    for i in range(1, PATTERN_CIRCULAR_7_COUNT):
        add(cut_extrude_10.rotate(pattern_circular_7_axis, i * 360 / PATTERN_CIRCULAR_7_COUNT), mode=Mode.SUBTRACT)

    # 草图30 → 切除-拉伸11 (cut)
    with BuildSketch(Plane(origin=(0, 3, 0), x_dir=(1, 0, 0), z_dir=(0, 1, 0))):
        Polygon((64.491247429, -4.106025533), (67.558473876, -4.927886382), (69.803839473, -2.682520785), (68.981978624, 0.384705662), (65.914752177, 1.206566512), (63.669386579, -1.038799086), align=None)
    cut_extrude_11 = extrude(amount=-CUT_EXTRUDE_11_DEPTH, mode=Mode.SUBTRACT)

    # 阵列(圆周)8: 切除-拉伸11 ×4 about axis
    pattern_circular_8_axis = Axis((59.665545214, 0, 8.931727747), (0, 1, 0))
    for i in range(1, PATTERN_CIRCULAR_8_COUNT):
        add(cut_extrude_11.rotate(pattern_circular_8_axis, i * 360 / PATTERN_CIRCULAR_8_COUNT), mode=Mode.SUBTRACT)


solid = body_2_2.part
